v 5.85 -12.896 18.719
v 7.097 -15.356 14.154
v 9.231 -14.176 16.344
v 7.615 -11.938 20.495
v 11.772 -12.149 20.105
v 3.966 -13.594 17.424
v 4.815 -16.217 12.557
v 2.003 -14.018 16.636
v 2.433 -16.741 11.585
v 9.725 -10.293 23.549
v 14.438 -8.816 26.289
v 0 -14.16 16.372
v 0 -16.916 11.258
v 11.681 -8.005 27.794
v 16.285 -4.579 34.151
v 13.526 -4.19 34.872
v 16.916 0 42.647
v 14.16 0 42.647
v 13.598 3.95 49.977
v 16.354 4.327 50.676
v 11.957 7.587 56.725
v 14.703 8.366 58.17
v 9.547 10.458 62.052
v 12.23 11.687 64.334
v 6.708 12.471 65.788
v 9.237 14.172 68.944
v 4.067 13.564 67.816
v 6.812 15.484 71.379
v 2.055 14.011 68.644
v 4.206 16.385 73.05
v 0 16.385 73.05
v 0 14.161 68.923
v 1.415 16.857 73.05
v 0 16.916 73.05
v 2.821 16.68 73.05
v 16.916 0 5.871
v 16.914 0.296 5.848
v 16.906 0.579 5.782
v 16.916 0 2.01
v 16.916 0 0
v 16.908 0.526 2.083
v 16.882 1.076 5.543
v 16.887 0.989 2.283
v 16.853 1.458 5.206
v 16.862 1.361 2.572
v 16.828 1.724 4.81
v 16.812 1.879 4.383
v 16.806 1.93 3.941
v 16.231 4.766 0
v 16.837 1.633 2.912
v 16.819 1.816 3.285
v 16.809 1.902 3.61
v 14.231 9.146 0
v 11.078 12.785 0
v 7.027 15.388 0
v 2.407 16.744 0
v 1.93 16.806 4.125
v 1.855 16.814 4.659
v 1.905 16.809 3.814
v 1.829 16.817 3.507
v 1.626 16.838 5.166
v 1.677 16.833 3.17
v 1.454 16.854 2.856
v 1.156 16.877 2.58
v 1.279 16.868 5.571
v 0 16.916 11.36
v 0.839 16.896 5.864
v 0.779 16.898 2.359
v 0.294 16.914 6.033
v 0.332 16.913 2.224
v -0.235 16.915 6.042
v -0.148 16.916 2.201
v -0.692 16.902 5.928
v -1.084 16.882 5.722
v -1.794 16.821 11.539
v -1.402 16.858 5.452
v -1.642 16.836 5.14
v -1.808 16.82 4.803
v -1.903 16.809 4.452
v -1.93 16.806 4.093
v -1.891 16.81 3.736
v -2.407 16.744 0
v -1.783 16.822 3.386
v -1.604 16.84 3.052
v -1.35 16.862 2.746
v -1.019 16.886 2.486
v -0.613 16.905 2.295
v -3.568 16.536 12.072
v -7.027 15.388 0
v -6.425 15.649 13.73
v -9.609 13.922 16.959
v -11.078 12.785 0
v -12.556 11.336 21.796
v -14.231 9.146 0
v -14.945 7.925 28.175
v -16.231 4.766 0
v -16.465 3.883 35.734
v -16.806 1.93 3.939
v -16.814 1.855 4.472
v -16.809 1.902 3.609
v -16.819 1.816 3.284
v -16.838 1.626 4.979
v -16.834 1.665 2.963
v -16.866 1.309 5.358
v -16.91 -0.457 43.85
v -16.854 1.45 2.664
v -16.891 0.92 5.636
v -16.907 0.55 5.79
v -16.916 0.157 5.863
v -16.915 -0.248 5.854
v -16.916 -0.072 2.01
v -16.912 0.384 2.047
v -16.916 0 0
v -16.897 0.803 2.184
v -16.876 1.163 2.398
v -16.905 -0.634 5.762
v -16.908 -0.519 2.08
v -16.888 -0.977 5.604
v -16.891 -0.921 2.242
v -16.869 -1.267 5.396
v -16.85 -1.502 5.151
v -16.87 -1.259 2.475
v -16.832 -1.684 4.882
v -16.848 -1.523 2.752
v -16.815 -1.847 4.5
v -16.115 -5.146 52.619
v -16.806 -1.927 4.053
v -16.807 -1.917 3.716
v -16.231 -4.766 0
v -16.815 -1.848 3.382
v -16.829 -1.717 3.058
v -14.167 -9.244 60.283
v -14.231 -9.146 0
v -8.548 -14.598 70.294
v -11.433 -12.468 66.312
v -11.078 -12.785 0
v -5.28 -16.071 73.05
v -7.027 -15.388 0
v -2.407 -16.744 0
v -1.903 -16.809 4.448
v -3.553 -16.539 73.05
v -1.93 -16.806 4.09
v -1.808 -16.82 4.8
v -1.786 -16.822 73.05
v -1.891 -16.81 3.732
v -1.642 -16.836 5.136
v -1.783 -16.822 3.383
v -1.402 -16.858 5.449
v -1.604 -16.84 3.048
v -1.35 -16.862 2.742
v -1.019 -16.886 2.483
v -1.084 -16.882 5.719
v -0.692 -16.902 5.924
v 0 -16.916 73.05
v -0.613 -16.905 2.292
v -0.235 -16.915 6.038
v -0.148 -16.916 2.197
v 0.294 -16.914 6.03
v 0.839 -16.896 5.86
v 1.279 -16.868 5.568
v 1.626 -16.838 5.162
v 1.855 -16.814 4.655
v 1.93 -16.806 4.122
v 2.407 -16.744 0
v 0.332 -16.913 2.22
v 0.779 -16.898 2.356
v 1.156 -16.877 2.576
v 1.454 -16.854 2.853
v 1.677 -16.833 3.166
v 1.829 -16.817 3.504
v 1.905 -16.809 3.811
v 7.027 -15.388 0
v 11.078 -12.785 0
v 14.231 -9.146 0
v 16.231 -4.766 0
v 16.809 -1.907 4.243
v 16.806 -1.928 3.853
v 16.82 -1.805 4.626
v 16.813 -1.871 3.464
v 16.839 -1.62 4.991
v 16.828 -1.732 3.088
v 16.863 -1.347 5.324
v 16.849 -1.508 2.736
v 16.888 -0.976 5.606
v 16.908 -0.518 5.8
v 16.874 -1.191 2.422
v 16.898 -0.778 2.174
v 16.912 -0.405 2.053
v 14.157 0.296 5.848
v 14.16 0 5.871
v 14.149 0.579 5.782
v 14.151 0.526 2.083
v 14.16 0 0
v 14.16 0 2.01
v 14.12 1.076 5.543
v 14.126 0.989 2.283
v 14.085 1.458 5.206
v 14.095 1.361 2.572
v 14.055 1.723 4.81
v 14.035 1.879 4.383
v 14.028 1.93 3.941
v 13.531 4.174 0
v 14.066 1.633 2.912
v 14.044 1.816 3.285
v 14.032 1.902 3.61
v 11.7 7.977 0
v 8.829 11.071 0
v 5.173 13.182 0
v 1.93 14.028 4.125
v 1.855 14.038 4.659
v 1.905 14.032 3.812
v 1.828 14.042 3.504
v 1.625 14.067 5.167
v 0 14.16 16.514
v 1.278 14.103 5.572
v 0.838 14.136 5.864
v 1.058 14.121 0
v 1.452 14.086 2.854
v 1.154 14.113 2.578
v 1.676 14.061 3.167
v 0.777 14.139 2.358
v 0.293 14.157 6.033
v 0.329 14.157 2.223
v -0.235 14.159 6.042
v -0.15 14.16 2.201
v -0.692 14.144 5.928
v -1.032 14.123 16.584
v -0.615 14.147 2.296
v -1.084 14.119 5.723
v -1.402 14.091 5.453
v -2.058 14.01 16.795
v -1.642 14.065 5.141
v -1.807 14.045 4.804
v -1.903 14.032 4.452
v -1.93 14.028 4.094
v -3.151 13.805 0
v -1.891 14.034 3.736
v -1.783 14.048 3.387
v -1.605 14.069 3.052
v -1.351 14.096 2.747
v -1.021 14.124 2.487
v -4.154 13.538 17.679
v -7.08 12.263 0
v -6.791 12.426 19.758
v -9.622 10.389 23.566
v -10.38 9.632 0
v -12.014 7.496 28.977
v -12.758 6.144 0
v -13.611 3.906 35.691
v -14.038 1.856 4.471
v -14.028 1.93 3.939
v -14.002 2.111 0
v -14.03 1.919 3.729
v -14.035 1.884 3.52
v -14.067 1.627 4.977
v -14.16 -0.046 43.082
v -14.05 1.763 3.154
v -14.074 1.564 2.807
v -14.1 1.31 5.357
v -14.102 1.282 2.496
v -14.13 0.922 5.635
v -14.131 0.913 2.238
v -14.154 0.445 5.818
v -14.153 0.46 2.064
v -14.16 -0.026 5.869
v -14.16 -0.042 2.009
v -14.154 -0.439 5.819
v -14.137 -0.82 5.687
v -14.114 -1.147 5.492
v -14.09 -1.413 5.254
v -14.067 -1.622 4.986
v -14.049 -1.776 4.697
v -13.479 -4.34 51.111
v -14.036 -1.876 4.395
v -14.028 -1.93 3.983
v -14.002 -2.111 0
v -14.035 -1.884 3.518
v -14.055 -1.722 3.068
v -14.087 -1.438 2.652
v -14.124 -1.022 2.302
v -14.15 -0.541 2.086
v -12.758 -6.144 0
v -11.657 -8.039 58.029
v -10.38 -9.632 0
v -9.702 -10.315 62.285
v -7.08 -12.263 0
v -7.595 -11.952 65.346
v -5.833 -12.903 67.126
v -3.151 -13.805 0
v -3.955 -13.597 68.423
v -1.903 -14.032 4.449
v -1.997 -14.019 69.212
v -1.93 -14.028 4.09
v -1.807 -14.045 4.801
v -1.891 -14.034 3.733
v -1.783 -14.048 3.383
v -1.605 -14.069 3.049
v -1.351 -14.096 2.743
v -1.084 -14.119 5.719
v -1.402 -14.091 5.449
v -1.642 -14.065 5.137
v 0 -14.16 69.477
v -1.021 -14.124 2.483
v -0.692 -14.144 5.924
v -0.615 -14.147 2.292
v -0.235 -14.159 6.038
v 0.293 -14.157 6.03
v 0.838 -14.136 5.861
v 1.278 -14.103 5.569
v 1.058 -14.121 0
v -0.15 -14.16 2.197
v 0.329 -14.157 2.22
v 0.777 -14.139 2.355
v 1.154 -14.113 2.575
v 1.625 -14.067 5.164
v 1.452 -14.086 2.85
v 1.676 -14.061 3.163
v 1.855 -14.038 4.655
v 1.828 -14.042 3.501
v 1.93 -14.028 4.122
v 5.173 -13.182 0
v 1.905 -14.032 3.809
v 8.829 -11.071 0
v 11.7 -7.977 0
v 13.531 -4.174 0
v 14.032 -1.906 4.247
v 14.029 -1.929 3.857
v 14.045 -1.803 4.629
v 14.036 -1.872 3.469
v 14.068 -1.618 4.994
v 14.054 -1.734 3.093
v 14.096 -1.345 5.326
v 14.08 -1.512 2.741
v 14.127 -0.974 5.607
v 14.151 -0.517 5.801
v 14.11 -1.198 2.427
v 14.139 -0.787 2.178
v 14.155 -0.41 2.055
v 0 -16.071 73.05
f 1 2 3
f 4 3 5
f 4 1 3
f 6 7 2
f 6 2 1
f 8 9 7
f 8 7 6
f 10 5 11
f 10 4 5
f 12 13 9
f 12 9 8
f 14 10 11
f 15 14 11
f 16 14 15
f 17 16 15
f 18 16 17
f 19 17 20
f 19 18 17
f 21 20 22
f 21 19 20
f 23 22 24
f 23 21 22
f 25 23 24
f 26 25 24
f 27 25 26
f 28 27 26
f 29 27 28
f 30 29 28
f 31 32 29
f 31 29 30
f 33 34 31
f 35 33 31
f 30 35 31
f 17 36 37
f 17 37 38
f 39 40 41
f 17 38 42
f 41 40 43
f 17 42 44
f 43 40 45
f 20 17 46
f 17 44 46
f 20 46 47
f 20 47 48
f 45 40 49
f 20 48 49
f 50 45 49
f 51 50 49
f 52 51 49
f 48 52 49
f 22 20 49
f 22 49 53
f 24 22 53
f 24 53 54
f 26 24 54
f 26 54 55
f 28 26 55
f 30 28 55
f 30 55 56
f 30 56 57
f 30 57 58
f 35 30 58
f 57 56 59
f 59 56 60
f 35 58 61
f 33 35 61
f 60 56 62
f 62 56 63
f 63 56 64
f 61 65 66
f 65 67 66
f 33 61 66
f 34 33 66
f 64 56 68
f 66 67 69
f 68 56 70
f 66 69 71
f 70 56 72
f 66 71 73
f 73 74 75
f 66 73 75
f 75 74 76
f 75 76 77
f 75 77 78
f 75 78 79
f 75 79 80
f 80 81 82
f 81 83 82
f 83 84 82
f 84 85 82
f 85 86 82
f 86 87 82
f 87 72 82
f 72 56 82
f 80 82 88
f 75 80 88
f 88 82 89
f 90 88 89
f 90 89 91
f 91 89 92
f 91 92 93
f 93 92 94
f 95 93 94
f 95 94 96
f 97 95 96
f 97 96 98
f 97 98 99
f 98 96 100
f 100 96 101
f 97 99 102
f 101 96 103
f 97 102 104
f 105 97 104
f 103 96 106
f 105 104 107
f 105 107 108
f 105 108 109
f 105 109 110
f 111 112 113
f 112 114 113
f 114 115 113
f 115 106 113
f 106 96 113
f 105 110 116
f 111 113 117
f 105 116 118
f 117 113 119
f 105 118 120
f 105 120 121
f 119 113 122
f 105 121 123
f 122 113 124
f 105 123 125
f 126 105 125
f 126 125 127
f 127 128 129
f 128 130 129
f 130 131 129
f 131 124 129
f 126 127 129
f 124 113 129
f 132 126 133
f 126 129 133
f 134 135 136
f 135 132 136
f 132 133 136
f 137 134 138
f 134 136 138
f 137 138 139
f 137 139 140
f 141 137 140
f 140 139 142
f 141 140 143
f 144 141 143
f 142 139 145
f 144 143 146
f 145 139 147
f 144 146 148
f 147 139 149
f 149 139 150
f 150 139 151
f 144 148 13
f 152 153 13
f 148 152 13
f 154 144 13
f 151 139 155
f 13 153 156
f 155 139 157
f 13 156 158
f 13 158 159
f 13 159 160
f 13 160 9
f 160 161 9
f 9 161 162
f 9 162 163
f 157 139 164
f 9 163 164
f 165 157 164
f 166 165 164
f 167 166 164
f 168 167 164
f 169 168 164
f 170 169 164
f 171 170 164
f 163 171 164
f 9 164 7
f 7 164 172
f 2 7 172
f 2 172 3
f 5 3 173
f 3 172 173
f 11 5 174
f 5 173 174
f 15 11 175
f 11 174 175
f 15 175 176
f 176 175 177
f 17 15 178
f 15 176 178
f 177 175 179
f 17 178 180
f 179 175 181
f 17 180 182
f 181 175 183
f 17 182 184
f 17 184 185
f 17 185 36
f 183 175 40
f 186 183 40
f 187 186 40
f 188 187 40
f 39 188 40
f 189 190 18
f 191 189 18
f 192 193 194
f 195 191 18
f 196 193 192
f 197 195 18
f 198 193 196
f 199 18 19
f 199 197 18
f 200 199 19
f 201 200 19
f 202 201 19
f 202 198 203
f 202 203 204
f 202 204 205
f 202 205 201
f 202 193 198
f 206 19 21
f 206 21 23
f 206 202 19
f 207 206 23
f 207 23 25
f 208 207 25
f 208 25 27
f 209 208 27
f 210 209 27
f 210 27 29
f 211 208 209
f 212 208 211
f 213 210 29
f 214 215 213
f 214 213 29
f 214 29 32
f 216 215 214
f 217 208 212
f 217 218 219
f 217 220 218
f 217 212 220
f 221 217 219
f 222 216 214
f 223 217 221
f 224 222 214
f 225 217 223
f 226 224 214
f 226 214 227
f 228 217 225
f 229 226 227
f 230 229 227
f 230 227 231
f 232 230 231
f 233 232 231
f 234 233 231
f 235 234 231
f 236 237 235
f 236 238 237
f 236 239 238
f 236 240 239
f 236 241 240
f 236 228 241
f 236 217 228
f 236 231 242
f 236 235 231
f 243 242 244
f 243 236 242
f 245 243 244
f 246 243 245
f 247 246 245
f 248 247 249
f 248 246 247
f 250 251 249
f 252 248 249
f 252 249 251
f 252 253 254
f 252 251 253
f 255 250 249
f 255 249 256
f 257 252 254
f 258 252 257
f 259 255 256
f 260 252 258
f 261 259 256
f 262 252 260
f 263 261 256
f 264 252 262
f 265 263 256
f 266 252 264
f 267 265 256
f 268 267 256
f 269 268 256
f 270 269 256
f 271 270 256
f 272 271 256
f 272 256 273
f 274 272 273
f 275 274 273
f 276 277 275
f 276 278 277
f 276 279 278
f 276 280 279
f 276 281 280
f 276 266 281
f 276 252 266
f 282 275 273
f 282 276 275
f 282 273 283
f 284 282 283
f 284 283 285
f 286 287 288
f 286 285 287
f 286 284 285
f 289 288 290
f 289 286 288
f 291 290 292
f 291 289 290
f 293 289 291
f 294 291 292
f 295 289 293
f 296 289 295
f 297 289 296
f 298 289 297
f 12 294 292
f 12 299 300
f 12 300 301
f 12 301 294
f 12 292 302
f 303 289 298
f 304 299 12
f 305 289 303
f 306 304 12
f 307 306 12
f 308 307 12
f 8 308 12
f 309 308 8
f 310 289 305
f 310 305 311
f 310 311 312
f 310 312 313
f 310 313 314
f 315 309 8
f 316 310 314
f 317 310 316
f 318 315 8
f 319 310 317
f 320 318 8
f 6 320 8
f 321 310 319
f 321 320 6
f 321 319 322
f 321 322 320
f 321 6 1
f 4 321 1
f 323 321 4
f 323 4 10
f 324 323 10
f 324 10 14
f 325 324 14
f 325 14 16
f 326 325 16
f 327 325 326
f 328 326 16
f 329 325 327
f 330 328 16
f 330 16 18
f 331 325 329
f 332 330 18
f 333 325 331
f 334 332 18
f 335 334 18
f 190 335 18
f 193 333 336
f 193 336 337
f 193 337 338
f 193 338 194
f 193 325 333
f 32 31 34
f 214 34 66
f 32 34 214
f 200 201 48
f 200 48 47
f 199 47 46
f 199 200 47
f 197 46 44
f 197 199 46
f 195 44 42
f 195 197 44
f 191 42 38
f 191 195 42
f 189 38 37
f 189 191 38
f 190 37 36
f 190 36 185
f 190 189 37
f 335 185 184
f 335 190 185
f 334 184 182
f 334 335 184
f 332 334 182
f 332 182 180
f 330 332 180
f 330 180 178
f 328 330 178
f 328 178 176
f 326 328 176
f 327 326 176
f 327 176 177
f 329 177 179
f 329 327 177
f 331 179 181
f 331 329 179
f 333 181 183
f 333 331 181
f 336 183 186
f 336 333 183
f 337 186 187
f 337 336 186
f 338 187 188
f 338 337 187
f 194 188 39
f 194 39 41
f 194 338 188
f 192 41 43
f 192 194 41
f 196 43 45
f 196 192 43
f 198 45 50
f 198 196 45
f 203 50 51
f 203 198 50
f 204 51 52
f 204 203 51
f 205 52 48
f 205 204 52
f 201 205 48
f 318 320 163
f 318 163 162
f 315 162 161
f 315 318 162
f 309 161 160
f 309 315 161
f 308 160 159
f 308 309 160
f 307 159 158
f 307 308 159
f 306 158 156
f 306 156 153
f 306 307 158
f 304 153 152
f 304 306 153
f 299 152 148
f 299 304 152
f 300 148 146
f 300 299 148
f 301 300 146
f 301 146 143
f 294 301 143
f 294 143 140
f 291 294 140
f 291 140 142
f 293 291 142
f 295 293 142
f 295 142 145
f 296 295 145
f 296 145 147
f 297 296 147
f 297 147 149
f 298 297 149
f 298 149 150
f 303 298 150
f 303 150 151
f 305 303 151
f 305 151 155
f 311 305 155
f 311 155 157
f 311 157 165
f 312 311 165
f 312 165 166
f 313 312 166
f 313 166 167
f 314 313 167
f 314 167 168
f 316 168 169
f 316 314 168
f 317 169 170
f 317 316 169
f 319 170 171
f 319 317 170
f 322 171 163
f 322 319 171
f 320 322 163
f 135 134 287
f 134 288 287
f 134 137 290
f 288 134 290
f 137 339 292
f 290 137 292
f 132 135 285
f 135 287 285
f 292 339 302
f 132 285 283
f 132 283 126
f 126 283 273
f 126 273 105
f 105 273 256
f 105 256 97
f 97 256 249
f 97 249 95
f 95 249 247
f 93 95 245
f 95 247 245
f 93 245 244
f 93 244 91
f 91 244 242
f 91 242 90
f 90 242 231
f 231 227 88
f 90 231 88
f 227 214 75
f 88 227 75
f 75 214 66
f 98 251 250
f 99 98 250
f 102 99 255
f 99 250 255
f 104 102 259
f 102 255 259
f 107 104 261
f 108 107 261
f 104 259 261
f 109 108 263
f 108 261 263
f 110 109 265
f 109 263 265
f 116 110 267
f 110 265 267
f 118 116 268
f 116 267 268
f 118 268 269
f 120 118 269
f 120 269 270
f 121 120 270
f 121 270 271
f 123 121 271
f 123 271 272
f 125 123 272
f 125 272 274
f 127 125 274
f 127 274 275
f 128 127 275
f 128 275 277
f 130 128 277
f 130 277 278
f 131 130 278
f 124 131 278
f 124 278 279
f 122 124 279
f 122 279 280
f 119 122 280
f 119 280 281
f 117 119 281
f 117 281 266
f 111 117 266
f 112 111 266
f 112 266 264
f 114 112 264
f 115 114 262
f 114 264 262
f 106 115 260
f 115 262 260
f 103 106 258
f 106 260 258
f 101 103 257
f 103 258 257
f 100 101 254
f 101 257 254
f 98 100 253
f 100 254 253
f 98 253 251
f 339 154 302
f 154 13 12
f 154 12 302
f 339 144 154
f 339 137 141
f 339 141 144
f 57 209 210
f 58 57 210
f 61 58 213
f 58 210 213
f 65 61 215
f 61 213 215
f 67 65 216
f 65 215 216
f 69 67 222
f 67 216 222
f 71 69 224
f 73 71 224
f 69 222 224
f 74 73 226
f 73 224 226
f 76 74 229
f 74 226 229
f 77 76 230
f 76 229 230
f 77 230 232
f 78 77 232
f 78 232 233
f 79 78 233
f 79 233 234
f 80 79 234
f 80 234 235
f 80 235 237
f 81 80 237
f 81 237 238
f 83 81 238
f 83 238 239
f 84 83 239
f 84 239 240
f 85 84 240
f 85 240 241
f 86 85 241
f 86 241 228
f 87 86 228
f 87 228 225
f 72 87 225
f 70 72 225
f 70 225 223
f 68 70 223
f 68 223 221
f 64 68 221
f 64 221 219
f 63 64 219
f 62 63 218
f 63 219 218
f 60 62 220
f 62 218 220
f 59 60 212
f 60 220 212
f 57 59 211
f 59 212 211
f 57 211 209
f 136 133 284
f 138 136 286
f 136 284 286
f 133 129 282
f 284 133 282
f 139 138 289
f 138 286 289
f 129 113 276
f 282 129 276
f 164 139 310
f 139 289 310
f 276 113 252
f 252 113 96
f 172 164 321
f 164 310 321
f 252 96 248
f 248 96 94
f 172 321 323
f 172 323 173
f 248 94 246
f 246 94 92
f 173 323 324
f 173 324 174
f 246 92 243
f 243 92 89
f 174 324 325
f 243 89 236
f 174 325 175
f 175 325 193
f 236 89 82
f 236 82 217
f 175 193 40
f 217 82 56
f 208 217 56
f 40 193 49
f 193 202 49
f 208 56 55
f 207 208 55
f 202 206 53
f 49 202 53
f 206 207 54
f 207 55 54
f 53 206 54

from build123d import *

# Parameters (mm, degrees)
F0_R      = 16.9164
F0_R_2    = 14.1605
F1_DEPTH  = 73.0504
F3_DEPTH  = 58.42
F5_DEPTH  = 25.4
F6_R      = 1.9304
F7_DEPTH  = 25.4
F8_R      = 1.9304
F9_DEPTH  = 35.814
F10_R     = 1.9304
F11_DEPTH = 25.4
F12_R     = 1.9304
F13_DEPTH = 44.196


with BuildPart() as f1:
    # F0 (on Top) → F1 (new body)
    with BuildSketch(Plane.XY):
        Circle(F0_R)
        Circle(F0_R_2, mode=Mode.SUBTRACT)
    extrude(amount=F1_DEPTH)

    # F2 (on Right) → F3 (cut)
    with BuildSketch(Plane.YZ):
        Polygon((-18.284496, 78.388058), (-18.916648, 7.546794), (19.261749, 78.388058), align=None)
    extrude(amount=F3_DEPTH, mode=Mode.SUBTRACT)

    # F4 (on Right) → F5 (cut)
    with BuildSketch(Plane.YZ):
        Polygon((-19.360213, 79.200871), (18.200016, 8.959677), (23.540258, 79.200871), align=None)
    extrude(amount=-F5_DEPTH, mode=Mode.SUBTRACT)

    # F6 (on Right) → F7 (cut)
    with BuildSketch(Plane.YZ):
        with Locations((0, 3.939143)):
            Circle(F6_R)
    extrude(amount=-F7_DEPTH, mode=Mode.SUBTRACT)

    # F8 (on Right) → F9 (cut)
    with BuildSketch(Plane.YZ):
        with Locations((0, 3.940872)):
            Circle(F8_R)
    extrude(amount=F9_DEPTH, mode=Mode.SUBTRACT)

    # F10 (on Front) → F11 (cut)
    with BuildSketch(Plane.XZ):
        with Locations((0, 4.125499)):
            Circle(F10_R)
    extrude(amount=-F11_DEPTH, mode=Mode.SUBTRACT)

    # F12 (on Front) → F13 (cut)
    with BuildSketch(Plane.XZ):
        with Locations((0, 4.12201)):
            Circle(F12_R)
    extrude(amount=F13_DEPTH, mode=Mode.SUBTRACT)


solid = f1.part
